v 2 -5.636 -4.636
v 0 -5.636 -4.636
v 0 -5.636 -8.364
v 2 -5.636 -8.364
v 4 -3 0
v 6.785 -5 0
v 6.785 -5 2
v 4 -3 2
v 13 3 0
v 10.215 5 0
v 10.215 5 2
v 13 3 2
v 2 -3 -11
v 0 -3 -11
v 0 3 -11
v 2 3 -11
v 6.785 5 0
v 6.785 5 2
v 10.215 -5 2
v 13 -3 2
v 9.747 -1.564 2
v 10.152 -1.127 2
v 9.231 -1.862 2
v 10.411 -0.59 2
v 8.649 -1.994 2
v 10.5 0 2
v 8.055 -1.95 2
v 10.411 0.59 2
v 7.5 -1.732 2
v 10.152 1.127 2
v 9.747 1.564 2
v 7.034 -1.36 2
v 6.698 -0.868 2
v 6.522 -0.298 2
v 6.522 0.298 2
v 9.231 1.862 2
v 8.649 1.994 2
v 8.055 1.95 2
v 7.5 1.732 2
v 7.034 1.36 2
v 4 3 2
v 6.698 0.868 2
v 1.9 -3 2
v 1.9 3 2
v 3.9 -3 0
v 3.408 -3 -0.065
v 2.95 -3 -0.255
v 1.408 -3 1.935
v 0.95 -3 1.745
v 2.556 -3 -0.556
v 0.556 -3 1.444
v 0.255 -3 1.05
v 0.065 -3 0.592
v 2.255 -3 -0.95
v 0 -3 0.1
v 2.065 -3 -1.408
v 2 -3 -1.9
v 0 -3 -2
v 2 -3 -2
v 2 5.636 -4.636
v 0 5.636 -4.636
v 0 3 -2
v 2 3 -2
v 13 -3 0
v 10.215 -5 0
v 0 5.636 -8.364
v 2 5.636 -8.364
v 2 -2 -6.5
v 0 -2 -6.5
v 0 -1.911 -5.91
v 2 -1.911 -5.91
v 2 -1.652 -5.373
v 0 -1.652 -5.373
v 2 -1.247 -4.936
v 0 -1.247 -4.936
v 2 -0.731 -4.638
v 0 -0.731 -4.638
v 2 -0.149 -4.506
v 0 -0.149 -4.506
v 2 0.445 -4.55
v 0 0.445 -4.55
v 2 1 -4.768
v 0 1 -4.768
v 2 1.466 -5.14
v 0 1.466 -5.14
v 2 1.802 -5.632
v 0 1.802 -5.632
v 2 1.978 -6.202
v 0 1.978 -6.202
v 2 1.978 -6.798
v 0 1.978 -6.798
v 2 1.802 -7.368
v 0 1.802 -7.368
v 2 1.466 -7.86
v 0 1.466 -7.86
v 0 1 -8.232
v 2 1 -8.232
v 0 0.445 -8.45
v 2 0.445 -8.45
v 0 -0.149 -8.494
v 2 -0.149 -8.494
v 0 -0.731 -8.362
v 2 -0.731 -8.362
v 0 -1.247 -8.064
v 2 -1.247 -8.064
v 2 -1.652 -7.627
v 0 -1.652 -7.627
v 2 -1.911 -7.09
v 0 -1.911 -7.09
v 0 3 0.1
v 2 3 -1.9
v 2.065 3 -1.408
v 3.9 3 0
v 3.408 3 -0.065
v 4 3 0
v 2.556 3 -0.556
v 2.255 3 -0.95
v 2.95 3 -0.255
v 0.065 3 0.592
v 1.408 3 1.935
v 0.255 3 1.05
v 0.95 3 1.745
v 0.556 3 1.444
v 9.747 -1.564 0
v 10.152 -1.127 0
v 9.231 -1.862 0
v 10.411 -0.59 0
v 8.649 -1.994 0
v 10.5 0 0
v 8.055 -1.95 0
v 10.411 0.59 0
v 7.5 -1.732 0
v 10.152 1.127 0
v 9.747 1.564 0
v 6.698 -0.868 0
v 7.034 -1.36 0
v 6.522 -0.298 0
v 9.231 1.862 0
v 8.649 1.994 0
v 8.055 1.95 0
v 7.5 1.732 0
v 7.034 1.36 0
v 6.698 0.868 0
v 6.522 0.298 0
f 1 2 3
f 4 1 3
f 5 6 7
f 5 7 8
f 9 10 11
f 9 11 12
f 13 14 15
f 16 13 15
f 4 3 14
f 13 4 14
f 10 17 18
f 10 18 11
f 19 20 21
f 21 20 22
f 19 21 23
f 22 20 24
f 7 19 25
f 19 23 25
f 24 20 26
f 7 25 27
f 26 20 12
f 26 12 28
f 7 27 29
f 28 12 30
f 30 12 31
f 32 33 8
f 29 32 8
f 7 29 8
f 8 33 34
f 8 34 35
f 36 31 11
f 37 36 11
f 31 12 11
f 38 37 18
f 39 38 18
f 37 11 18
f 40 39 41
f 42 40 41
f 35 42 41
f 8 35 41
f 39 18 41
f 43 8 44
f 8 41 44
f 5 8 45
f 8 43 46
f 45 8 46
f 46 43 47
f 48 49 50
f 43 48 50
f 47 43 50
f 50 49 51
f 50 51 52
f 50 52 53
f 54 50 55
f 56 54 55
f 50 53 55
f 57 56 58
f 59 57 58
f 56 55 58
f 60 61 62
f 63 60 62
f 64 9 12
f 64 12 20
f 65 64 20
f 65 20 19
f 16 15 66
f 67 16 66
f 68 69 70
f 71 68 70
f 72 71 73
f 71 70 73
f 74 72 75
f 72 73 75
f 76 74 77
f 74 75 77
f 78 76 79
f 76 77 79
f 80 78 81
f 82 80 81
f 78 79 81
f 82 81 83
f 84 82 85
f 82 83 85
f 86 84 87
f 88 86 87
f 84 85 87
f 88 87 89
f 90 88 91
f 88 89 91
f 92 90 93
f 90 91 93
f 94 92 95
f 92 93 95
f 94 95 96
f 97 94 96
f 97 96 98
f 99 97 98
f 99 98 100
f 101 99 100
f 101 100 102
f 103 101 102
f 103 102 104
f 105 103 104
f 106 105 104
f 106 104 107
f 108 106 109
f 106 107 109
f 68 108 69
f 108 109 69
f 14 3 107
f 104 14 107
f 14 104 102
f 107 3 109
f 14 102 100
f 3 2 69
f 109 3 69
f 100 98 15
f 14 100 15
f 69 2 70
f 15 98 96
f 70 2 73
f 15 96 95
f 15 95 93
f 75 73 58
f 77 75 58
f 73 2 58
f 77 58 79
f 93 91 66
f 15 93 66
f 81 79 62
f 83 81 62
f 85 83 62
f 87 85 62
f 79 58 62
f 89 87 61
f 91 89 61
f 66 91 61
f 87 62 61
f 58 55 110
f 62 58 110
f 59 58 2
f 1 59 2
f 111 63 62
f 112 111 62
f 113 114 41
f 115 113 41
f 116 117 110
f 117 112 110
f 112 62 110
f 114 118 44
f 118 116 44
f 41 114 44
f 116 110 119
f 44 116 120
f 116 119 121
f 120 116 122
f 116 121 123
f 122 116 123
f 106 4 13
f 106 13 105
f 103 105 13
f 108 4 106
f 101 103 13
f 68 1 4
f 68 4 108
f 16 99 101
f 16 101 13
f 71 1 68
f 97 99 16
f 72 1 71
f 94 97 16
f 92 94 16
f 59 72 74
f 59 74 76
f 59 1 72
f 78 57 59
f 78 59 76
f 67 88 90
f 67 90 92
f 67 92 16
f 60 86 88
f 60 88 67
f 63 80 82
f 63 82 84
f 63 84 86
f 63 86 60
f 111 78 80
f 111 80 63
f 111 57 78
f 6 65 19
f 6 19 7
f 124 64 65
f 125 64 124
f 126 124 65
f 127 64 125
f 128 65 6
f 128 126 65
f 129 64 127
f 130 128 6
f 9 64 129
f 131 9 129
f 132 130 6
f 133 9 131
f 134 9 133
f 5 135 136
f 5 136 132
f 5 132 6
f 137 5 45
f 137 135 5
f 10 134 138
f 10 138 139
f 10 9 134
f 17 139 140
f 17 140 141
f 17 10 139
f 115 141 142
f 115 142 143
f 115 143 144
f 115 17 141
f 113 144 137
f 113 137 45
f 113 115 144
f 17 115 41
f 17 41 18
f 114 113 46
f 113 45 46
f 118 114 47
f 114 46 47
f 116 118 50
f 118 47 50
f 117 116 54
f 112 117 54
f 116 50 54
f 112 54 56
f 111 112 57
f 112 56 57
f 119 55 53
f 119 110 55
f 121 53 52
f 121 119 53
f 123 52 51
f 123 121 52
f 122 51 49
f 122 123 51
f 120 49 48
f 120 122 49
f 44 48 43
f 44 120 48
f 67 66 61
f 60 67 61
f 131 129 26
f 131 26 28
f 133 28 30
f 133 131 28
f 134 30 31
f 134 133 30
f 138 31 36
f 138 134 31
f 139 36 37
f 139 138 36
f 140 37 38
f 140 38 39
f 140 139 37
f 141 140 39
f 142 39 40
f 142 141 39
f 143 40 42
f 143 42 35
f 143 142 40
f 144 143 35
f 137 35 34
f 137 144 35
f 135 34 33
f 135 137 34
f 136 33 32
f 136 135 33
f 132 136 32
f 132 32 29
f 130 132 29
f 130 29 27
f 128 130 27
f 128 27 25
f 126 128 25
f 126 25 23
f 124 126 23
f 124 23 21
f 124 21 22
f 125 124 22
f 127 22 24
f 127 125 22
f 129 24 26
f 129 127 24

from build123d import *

# Parameters (mm, degrees)
SKETCH_R     = 2
PAD_DEPTH    = 2
SKETCH001_R  = 2
PAD001_DEPTH = 2
FILLET_R     = 1.9


with BuildPart() as part:
    # Sketch → Pad (new body)
    with BuildSketch(Plane.XY):
        Polygon((13, 3), (13, -3), (10.21455, -5), (6.78545, -5), (4, -3), (0, -3), (0, 3), (4, 3), (6.78545, 5), (10.21455, 5), align=None)
        with Locations((8.5, 0)):
            Circle(SKETCH_R, mode=Mode.SUBTRACT)
    extrude(amount=PAD_DEPTH)

    # Sketch001 → Pad001 (new body)
    with BuildSketch(Plane(origin=(0, 0, 0), x_dir=(0, -1, 0), z_dir=(-1, 0, 0))):
        Polygon((-3, 0), (3, 0), (3, -2), (5.636039, -4.636039), (5.636039, -8.363961), (3, -11), (-3, -11), (-5.636039, -8.363961), (-5.636039, -4.636039), (-3, -2), align=None)
        with Locations((0, -6.5)):
            Circle(SKETCH001_R, mode=Mode.SUBTRACT)
    extrude(amount=-PAD001_DEPTH)

    # Fillet
    fillet_edges = [part.edges().sort_by_distance(p)[0] for p in [
        (2, 0, 0),
        (0, 0, 2),
    ]]
    fillet(fillet_edges, radius=FILLET_R)


solid = part.part
